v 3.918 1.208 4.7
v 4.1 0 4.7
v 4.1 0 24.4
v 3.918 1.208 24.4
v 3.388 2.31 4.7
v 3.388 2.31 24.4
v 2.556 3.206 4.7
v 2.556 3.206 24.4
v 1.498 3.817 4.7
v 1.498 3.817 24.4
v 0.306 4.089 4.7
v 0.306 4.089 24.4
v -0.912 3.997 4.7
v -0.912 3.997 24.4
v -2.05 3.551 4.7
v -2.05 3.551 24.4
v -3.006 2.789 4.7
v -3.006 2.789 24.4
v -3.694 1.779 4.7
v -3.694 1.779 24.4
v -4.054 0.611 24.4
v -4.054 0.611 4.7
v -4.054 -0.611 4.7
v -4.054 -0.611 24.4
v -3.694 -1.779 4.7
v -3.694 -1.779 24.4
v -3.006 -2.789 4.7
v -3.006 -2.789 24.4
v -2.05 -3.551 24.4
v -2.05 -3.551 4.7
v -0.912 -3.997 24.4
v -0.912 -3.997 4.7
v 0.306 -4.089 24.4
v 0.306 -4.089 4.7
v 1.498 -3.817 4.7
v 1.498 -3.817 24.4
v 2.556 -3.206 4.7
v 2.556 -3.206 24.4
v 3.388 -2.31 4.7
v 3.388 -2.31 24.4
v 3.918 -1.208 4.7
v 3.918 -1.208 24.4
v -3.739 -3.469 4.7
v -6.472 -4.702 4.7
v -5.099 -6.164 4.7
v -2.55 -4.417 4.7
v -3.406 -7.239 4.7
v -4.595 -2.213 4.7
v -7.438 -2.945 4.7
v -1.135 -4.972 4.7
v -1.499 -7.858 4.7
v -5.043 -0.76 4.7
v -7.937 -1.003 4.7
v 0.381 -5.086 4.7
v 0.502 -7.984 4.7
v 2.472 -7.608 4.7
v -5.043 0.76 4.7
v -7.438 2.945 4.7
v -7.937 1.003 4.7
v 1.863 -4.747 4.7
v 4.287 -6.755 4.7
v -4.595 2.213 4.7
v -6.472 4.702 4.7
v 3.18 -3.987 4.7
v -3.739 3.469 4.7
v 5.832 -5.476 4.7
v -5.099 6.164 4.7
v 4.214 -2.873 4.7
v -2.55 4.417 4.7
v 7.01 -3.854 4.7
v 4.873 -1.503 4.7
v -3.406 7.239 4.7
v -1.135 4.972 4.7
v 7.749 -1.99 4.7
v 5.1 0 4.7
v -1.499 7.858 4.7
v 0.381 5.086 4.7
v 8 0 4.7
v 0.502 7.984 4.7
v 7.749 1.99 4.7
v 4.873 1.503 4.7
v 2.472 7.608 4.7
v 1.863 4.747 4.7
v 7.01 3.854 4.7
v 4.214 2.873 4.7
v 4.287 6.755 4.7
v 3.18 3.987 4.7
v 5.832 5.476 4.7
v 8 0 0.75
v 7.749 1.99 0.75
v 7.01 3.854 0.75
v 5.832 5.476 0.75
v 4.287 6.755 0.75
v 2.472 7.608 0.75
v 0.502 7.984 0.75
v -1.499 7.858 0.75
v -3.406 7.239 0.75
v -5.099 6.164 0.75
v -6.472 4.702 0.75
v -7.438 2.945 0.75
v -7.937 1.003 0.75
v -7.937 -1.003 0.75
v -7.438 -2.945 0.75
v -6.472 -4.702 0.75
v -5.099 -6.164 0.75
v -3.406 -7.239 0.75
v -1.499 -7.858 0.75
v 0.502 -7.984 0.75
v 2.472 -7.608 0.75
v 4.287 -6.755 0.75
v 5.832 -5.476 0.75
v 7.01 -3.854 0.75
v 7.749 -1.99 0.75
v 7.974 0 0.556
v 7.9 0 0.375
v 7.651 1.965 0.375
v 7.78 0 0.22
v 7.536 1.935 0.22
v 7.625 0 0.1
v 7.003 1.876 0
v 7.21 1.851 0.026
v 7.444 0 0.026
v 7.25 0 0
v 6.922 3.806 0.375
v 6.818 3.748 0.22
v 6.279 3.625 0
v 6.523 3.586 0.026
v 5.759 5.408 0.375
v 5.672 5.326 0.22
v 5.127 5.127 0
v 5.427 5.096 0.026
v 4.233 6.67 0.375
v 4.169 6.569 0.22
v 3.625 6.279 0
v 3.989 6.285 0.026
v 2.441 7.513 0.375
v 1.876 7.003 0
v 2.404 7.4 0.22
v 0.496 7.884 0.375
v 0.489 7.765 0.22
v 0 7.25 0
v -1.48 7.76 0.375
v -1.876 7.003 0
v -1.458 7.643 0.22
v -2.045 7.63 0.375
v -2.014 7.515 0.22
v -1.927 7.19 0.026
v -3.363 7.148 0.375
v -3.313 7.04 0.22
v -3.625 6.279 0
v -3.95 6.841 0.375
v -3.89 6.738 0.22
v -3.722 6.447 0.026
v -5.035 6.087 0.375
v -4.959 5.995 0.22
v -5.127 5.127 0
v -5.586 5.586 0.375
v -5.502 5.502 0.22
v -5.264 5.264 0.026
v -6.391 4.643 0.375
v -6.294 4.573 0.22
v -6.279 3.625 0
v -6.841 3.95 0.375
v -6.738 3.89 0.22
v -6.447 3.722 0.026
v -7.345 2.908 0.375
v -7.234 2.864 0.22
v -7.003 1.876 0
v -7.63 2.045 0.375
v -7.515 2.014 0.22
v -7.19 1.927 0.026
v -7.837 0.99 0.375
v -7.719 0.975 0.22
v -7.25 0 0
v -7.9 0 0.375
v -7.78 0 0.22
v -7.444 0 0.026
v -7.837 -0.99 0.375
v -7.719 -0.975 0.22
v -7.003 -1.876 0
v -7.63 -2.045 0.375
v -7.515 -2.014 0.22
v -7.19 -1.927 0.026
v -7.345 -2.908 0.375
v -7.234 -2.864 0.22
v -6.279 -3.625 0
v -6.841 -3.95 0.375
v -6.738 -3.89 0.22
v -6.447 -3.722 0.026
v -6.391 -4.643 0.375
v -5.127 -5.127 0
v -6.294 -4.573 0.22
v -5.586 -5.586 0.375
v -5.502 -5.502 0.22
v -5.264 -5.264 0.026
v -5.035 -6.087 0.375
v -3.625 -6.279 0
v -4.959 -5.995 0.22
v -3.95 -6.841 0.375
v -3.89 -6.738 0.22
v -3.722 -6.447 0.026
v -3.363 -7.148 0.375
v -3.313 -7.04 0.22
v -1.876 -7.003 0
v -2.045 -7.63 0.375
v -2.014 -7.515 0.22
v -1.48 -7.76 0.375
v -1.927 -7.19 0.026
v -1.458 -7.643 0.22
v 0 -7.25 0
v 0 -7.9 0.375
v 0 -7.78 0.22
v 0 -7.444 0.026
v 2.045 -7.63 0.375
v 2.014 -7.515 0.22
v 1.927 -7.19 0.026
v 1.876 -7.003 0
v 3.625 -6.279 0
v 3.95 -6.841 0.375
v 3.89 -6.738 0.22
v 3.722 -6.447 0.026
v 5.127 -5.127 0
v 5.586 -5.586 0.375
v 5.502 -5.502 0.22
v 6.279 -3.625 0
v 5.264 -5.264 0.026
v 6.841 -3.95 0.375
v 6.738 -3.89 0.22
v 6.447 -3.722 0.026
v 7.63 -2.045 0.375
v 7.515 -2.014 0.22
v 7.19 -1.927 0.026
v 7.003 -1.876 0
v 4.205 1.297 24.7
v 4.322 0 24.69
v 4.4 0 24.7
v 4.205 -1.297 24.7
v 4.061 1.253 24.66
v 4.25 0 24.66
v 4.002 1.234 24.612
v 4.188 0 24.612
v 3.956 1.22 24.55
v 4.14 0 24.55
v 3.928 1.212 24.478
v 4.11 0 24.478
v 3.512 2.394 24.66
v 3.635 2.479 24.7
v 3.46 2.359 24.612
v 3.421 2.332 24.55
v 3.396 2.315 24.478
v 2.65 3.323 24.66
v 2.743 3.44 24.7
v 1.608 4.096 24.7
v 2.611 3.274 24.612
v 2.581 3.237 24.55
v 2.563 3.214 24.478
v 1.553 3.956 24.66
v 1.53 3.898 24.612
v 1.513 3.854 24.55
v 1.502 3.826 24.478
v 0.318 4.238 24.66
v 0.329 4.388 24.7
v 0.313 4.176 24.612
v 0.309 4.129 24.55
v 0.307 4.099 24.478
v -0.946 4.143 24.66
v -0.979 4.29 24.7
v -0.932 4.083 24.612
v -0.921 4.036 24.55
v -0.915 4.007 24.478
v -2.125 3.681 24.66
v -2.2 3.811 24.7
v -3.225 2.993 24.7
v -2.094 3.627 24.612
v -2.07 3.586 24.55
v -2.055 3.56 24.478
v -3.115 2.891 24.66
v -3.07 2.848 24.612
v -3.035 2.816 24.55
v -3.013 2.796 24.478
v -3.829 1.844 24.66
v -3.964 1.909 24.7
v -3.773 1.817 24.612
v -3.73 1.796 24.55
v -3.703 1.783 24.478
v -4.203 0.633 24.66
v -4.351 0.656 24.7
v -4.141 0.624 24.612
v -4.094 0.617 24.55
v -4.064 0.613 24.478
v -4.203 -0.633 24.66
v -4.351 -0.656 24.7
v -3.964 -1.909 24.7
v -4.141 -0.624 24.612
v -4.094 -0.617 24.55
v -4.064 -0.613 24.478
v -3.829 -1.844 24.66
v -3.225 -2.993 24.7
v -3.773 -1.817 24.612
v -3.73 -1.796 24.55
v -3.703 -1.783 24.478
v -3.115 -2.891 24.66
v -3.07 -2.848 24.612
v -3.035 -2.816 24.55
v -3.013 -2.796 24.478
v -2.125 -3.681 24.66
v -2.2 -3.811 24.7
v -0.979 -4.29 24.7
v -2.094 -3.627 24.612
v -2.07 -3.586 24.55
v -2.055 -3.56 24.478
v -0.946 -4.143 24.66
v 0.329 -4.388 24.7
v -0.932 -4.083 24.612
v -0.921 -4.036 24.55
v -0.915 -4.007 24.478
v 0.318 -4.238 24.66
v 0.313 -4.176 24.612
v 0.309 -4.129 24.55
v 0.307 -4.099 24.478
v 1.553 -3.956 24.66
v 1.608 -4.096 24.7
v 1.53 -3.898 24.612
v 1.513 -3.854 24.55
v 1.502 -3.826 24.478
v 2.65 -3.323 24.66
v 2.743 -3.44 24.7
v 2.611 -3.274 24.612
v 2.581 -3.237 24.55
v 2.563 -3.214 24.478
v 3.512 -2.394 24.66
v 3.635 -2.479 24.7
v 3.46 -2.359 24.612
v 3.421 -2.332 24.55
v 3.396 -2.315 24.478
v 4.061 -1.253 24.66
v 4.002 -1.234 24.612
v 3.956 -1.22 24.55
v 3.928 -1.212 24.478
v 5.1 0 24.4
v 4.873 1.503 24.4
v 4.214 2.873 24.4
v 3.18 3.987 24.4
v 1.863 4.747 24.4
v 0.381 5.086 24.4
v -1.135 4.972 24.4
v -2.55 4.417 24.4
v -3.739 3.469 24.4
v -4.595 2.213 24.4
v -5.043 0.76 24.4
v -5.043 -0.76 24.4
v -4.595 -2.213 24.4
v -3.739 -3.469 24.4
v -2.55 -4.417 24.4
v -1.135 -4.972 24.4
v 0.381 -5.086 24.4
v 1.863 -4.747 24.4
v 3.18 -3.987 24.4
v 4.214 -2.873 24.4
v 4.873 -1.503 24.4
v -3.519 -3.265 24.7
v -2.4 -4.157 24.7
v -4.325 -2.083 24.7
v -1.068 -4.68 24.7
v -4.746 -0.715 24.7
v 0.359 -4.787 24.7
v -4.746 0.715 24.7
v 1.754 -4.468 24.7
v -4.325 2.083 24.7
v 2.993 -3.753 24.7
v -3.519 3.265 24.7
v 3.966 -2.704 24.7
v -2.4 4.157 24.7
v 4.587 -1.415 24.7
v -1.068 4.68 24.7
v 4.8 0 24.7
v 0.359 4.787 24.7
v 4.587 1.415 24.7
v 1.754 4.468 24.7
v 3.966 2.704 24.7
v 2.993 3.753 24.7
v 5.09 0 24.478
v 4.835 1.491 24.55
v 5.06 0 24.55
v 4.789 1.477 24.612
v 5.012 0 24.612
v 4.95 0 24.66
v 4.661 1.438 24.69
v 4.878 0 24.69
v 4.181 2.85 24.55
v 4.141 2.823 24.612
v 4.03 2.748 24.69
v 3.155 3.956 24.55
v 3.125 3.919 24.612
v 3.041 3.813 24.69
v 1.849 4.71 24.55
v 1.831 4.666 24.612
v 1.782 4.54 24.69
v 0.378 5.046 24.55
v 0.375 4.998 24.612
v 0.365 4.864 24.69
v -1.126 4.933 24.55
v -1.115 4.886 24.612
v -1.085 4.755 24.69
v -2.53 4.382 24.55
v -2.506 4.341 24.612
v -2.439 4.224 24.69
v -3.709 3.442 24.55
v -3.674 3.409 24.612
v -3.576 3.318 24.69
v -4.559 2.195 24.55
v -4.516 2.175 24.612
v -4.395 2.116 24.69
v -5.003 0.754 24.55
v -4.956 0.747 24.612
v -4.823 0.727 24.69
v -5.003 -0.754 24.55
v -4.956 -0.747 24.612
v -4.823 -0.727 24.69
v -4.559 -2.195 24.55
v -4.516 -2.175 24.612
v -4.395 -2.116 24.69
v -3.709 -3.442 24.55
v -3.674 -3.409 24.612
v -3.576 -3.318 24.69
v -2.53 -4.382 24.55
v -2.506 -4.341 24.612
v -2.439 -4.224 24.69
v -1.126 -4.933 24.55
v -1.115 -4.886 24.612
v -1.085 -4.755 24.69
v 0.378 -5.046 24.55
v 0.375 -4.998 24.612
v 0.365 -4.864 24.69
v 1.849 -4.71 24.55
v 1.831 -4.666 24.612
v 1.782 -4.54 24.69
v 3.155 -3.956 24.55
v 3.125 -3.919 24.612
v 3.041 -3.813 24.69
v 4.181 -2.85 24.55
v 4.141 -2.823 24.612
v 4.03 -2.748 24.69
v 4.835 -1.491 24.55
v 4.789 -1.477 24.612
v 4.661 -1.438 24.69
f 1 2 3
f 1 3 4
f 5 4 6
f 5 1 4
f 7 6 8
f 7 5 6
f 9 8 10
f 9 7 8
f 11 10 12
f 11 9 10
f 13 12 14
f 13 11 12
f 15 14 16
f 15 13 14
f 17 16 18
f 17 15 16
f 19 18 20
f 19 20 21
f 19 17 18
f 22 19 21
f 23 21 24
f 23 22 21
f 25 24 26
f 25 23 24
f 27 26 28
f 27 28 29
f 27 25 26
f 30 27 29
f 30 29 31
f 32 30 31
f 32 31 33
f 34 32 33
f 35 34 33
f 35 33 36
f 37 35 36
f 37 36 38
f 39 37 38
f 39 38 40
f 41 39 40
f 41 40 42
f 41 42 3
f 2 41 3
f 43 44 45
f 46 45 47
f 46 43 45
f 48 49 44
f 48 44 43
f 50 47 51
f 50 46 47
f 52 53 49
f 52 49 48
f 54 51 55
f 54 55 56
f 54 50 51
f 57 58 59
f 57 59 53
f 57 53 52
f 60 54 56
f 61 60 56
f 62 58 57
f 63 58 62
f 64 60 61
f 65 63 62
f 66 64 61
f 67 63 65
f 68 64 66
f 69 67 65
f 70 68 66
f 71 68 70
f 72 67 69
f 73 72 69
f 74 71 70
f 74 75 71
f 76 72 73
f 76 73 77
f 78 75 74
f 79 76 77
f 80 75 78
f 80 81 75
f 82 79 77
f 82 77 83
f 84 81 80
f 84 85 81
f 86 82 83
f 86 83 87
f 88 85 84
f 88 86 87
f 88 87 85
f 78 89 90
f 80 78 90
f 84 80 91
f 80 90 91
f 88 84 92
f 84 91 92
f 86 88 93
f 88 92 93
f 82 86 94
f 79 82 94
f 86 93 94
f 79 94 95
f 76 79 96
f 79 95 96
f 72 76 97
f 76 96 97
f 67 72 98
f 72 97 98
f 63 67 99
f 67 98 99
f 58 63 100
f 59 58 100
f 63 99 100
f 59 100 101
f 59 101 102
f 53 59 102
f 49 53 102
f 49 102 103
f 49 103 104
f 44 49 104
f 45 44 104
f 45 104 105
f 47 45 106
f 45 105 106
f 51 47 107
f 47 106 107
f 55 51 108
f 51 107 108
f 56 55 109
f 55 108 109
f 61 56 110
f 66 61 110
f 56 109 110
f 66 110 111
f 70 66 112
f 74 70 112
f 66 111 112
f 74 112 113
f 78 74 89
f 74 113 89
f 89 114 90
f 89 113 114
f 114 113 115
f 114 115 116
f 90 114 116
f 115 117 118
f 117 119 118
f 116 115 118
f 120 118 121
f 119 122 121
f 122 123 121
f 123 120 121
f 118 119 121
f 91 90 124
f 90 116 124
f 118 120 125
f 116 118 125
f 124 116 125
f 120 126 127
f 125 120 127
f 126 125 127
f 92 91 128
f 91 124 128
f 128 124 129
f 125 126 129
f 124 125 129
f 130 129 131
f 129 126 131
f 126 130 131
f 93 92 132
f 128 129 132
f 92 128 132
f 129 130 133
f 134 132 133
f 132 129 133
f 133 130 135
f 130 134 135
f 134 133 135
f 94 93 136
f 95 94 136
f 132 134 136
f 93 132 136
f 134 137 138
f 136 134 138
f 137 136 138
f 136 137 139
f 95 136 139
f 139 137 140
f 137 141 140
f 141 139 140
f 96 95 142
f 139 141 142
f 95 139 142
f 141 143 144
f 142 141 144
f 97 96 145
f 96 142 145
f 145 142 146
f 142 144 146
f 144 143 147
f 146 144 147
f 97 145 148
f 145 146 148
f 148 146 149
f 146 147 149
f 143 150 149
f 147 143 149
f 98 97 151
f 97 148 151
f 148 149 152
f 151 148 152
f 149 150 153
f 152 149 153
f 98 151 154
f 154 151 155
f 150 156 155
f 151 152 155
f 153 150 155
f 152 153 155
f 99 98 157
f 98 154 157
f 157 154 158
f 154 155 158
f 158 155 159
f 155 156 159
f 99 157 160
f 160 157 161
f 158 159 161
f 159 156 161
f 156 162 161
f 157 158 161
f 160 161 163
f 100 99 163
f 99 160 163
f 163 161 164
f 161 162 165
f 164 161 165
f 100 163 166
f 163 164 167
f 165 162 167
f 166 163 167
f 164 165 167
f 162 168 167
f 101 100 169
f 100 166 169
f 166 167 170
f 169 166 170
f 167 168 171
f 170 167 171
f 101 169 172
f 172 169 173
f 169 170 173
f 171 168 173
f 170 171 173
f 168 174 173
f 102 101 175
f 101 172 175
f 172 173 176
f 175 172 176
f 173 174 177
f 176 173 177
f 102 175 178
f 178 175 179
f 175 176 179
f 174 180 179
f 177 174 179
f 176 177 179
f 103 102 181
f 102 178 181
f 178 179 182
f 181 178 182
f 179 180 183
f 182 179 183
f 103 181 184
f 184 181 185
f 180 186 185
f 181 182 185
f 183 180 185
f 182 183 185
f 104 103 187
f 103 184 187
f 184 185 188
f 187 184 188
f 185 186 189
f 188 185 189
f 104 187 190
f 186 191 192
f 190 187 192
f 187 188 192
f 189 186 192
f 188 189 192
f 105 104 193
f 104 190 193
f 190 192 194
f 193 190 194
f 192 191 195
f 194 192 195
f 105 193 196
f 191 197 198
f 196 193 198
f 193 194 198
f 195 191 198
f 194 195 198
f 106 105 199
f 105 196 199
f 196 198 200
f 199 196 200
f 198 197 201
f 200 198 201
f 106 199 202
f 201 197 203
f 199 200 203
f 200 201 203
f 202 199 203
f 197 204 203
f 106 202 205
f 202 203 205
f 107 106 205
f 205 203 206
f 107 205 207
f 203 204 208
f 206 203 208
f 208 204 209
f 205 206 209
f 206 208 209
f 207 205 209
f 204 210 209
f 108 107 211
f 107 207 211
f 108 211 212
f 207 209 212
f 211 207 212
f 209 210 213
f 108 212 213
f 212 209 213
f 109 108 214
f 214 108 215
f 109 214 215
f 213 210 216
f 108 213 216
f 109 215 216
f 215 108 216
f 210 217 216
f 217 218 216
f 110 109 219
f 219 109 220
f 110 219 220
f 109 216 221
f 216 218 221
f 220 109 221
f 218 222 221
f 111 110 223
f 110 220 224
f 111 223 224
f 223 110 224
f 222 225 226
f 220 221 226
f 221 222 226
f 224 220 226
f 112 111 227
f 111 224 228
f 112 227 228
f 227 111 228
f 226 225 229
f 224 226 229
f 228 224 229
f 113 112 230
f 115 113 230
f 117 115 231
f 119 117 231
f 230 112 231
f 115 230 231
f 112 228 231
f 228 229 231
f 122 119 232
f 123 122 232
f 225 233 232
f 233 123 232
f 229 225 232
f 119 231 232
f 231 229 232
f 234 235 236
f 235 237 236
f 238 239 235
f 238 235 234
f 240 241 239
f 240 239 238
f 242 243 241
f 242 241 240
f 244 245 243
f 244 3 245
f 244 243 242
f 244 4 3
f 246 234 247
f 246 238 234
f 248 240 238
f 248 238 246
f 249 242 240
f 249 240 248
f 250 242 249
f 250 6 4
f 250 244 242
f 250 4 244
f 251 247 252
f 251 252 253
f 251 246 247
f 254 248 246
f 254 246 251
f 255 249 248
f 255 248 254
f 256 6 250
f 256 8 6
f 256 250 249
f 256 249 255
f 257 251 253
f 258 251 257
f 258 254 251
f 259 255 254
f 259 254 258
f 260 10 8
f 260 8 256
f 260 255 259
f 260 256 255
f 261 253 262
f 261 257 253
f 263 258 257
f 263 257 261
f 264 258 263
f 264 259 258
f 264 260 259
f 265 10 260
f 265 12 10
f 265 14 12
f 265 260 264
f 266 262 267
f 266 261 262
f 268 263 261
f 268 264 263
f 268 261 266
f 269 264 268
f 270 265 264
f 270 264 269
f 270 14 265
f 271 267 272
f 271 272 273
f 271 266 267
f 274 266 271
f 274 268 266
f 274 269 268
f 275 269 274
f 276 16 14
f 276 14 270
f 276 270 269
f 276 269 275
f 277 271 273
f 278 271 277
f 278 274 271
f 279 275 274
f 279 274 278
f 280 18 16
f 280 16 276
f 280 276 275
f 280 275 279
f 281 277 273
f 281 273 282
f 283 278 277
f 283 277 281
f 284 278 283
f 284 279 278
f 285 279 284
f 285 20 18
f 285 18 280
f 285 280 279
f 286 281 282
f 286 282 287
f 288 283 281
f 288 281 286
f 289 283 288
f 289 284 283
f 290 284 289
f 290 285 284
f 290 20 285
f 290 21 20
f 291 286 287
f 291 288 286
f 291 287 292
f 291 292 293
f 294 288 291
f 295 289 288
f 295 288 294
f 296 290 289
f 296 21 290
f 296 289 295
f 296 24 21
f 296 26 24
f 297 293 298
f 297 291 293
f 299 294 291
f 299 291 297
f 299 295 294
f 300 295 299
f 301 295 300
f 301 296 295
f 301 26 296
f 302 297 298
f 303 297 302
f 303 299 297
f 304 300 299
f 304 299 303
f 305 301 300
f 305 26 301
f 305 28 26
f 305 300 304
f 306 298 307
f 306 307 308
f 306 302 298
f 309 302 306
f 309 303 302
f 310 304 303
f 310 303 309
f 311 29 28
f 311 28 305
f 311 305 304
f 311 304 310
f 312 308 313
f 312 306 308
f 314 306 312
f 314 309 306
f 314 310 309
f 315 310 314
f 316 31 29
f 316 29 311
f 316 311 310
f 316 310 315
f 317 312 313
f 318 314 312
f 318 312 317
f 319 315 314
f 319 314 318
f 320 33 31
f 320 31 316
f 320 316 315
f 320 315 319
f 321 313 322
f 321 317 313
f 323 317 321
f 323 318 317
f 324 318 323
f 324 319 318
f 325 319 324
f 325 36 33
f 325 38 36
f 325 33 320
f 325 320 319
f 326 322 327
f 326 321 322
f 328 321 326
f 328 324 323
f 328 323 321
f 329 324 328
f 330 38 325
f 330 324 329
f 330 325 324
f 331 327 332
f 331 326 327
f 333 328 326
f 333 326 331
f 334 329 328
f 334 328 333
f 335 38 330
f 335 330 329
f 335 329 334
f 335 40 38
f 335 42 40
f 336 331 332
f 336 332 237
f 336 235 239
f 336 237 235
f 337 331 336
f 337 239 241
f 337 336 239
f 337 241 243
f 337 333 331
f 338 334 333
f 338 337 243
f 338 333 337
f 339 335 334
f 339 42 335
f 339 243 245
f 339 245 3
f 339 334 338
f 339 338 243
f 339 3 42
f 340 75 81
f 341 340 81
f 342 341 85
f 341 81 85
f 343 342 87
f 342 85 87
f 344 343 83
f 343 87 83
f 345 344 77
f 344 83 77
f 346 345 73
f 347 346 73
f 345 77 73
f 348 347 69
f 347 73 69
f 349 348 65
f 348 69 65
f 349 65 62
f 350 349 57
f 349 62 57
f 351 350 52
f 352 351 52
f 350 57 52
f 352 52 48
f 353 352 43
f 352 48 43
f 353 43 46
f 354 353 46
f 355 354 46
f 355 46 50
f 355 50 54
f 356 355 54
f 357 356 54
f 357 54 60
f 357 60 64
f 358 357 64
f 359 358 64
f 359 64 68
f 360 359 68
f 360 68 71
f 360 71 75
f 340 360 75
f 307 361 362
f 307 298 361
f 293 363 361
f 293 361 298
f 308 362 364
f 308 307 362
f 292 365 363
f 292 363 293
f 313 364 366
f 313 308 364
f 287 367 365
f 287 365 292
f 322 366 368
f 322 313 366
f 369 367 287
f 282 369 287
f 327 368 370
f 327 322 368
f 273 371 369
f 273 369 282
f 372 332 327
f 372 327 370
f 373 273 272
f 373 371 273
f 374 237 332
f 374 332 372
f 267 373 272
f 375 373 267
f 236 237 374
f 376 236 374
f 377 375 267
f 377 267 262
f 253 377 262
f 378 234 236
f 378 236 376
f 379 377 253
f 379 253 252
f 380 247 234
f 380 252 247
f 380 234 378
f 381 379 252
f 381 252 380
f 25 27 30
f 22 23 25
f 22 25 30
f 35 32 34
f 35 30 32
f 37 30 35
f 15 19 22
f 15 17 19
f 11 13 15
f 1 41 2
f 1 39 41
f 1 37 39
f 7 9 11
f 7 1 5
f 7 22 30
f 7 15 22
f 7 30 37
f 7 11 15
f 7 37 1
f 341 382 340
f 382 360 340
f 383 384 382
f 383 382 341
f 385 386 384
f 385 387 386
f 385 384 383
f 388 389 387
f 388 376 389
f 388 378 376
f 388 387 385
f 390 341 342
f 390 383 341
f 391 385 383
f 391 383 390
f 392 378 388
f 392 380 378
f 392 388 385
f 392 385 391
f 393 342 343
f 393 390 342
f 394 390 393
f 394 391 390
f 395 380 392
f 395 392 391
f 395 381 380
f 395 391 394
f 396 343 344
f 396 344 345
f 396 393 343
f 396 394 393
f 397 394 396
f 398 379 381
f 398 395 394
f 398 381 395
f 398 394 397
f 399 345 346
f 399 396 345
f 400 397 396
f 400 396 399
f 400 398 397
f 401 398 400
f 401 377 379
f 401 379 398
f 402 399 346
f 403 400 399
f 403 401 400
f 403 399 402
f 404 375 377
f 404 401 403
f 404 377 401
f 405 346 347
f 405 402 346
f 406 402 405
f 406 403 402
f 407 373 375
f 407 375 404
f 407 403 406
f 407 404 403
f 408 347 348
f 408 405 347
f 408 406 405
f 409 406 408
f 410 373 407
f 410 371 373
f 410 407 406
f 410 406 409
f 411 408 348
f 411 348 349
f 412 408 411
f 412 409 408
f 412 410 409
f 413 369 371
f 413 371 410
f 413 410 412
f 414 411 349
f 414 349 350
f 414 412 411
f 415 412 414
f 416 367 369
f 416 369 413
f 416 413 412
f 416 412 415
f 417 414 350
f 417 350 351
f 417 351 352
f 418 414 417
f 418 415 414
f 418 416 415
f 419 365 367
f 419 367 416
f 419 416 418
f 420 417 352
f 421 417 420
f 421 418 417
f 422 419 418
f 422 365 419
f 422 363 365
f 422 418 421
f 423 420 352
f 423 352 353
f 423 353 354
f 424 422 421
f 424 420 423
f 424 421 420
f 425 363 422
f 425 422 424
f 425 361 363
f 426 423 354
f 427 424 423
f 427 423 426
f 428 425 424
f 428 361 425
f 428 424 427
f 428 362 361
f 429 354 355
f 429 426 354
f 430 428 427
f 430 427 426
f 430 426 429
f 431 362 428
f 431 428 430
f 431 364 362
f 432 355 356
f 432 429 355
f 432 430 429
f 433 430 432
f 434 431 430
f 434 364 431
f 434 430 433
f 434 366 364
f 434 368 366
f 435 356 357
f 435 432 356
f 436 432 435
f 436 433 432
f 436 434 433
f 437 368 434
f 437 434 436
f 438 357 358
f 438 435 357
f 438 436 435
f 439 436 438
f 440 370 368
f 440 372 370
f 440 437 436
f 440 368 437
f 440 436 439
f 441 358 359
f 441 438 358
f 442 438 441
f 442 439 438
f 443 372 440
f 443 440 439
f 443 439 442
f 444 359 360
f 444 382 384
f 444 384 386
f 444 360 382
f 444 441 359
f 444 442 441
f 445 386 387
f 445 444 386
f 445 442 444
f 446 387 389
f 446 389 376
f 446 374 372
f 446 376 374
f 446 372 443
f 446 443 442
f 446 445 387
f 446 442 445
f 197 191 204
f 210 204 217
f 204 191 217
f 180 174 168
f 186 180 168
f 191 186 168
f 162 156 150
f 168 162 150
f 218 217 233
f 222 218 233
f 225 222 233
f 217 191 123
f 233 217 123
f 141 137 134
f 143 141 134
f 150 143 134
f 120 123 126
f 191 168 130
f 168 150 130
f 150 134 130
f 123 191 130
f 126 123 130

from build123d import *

# Parameters (mm, degrees)
F0_R     = 8
F0_R_2   = 5.1
F0_R_3   = 4.1
F1_DEPTH = 4.7
F2_DEPTH = 24.7
F3_R     = 0.3
F4_R     = 0.75


with BuildPart() as f1:
    # F0 (on Top) → F1 (new body)
    with BuildSketch(Plane.XY):
        Circle(F0_R)
        Circle(F0_R_2, mode=Mode.SUBTRACT)
        Circle(F0_R_2)
        Circle(F0_R_3, mode=Mode.SUBTRACT)
        Circle(F0_R_3)
    extrude(amount=F1_DEPTH)

    # F0 (on Top) → F2 (join)
    with BuildSketch(Plane.XY):
        Circle(F0_R_2)
        Circle(F0_R_3, mode=Mode.SUBTRACT)
    extrude(amount=F2_DEPTH)

    # F3
    f3_edges = [f1.edges().sort_by_distance(p)[0] for p in [
        (-5.1, 0, 24.7),
        (-4.1, 0, 24.7),
    ]]
    fillet(f3_edges, radius=F3_R)

    # F4
    f4_edges = [f1.edges().sort_by_distance(p)[0] for p in [
        (-8, 0, 0),
    ]]
    fillet(f4_edges, radius=F4_R)


solid = f1.part
